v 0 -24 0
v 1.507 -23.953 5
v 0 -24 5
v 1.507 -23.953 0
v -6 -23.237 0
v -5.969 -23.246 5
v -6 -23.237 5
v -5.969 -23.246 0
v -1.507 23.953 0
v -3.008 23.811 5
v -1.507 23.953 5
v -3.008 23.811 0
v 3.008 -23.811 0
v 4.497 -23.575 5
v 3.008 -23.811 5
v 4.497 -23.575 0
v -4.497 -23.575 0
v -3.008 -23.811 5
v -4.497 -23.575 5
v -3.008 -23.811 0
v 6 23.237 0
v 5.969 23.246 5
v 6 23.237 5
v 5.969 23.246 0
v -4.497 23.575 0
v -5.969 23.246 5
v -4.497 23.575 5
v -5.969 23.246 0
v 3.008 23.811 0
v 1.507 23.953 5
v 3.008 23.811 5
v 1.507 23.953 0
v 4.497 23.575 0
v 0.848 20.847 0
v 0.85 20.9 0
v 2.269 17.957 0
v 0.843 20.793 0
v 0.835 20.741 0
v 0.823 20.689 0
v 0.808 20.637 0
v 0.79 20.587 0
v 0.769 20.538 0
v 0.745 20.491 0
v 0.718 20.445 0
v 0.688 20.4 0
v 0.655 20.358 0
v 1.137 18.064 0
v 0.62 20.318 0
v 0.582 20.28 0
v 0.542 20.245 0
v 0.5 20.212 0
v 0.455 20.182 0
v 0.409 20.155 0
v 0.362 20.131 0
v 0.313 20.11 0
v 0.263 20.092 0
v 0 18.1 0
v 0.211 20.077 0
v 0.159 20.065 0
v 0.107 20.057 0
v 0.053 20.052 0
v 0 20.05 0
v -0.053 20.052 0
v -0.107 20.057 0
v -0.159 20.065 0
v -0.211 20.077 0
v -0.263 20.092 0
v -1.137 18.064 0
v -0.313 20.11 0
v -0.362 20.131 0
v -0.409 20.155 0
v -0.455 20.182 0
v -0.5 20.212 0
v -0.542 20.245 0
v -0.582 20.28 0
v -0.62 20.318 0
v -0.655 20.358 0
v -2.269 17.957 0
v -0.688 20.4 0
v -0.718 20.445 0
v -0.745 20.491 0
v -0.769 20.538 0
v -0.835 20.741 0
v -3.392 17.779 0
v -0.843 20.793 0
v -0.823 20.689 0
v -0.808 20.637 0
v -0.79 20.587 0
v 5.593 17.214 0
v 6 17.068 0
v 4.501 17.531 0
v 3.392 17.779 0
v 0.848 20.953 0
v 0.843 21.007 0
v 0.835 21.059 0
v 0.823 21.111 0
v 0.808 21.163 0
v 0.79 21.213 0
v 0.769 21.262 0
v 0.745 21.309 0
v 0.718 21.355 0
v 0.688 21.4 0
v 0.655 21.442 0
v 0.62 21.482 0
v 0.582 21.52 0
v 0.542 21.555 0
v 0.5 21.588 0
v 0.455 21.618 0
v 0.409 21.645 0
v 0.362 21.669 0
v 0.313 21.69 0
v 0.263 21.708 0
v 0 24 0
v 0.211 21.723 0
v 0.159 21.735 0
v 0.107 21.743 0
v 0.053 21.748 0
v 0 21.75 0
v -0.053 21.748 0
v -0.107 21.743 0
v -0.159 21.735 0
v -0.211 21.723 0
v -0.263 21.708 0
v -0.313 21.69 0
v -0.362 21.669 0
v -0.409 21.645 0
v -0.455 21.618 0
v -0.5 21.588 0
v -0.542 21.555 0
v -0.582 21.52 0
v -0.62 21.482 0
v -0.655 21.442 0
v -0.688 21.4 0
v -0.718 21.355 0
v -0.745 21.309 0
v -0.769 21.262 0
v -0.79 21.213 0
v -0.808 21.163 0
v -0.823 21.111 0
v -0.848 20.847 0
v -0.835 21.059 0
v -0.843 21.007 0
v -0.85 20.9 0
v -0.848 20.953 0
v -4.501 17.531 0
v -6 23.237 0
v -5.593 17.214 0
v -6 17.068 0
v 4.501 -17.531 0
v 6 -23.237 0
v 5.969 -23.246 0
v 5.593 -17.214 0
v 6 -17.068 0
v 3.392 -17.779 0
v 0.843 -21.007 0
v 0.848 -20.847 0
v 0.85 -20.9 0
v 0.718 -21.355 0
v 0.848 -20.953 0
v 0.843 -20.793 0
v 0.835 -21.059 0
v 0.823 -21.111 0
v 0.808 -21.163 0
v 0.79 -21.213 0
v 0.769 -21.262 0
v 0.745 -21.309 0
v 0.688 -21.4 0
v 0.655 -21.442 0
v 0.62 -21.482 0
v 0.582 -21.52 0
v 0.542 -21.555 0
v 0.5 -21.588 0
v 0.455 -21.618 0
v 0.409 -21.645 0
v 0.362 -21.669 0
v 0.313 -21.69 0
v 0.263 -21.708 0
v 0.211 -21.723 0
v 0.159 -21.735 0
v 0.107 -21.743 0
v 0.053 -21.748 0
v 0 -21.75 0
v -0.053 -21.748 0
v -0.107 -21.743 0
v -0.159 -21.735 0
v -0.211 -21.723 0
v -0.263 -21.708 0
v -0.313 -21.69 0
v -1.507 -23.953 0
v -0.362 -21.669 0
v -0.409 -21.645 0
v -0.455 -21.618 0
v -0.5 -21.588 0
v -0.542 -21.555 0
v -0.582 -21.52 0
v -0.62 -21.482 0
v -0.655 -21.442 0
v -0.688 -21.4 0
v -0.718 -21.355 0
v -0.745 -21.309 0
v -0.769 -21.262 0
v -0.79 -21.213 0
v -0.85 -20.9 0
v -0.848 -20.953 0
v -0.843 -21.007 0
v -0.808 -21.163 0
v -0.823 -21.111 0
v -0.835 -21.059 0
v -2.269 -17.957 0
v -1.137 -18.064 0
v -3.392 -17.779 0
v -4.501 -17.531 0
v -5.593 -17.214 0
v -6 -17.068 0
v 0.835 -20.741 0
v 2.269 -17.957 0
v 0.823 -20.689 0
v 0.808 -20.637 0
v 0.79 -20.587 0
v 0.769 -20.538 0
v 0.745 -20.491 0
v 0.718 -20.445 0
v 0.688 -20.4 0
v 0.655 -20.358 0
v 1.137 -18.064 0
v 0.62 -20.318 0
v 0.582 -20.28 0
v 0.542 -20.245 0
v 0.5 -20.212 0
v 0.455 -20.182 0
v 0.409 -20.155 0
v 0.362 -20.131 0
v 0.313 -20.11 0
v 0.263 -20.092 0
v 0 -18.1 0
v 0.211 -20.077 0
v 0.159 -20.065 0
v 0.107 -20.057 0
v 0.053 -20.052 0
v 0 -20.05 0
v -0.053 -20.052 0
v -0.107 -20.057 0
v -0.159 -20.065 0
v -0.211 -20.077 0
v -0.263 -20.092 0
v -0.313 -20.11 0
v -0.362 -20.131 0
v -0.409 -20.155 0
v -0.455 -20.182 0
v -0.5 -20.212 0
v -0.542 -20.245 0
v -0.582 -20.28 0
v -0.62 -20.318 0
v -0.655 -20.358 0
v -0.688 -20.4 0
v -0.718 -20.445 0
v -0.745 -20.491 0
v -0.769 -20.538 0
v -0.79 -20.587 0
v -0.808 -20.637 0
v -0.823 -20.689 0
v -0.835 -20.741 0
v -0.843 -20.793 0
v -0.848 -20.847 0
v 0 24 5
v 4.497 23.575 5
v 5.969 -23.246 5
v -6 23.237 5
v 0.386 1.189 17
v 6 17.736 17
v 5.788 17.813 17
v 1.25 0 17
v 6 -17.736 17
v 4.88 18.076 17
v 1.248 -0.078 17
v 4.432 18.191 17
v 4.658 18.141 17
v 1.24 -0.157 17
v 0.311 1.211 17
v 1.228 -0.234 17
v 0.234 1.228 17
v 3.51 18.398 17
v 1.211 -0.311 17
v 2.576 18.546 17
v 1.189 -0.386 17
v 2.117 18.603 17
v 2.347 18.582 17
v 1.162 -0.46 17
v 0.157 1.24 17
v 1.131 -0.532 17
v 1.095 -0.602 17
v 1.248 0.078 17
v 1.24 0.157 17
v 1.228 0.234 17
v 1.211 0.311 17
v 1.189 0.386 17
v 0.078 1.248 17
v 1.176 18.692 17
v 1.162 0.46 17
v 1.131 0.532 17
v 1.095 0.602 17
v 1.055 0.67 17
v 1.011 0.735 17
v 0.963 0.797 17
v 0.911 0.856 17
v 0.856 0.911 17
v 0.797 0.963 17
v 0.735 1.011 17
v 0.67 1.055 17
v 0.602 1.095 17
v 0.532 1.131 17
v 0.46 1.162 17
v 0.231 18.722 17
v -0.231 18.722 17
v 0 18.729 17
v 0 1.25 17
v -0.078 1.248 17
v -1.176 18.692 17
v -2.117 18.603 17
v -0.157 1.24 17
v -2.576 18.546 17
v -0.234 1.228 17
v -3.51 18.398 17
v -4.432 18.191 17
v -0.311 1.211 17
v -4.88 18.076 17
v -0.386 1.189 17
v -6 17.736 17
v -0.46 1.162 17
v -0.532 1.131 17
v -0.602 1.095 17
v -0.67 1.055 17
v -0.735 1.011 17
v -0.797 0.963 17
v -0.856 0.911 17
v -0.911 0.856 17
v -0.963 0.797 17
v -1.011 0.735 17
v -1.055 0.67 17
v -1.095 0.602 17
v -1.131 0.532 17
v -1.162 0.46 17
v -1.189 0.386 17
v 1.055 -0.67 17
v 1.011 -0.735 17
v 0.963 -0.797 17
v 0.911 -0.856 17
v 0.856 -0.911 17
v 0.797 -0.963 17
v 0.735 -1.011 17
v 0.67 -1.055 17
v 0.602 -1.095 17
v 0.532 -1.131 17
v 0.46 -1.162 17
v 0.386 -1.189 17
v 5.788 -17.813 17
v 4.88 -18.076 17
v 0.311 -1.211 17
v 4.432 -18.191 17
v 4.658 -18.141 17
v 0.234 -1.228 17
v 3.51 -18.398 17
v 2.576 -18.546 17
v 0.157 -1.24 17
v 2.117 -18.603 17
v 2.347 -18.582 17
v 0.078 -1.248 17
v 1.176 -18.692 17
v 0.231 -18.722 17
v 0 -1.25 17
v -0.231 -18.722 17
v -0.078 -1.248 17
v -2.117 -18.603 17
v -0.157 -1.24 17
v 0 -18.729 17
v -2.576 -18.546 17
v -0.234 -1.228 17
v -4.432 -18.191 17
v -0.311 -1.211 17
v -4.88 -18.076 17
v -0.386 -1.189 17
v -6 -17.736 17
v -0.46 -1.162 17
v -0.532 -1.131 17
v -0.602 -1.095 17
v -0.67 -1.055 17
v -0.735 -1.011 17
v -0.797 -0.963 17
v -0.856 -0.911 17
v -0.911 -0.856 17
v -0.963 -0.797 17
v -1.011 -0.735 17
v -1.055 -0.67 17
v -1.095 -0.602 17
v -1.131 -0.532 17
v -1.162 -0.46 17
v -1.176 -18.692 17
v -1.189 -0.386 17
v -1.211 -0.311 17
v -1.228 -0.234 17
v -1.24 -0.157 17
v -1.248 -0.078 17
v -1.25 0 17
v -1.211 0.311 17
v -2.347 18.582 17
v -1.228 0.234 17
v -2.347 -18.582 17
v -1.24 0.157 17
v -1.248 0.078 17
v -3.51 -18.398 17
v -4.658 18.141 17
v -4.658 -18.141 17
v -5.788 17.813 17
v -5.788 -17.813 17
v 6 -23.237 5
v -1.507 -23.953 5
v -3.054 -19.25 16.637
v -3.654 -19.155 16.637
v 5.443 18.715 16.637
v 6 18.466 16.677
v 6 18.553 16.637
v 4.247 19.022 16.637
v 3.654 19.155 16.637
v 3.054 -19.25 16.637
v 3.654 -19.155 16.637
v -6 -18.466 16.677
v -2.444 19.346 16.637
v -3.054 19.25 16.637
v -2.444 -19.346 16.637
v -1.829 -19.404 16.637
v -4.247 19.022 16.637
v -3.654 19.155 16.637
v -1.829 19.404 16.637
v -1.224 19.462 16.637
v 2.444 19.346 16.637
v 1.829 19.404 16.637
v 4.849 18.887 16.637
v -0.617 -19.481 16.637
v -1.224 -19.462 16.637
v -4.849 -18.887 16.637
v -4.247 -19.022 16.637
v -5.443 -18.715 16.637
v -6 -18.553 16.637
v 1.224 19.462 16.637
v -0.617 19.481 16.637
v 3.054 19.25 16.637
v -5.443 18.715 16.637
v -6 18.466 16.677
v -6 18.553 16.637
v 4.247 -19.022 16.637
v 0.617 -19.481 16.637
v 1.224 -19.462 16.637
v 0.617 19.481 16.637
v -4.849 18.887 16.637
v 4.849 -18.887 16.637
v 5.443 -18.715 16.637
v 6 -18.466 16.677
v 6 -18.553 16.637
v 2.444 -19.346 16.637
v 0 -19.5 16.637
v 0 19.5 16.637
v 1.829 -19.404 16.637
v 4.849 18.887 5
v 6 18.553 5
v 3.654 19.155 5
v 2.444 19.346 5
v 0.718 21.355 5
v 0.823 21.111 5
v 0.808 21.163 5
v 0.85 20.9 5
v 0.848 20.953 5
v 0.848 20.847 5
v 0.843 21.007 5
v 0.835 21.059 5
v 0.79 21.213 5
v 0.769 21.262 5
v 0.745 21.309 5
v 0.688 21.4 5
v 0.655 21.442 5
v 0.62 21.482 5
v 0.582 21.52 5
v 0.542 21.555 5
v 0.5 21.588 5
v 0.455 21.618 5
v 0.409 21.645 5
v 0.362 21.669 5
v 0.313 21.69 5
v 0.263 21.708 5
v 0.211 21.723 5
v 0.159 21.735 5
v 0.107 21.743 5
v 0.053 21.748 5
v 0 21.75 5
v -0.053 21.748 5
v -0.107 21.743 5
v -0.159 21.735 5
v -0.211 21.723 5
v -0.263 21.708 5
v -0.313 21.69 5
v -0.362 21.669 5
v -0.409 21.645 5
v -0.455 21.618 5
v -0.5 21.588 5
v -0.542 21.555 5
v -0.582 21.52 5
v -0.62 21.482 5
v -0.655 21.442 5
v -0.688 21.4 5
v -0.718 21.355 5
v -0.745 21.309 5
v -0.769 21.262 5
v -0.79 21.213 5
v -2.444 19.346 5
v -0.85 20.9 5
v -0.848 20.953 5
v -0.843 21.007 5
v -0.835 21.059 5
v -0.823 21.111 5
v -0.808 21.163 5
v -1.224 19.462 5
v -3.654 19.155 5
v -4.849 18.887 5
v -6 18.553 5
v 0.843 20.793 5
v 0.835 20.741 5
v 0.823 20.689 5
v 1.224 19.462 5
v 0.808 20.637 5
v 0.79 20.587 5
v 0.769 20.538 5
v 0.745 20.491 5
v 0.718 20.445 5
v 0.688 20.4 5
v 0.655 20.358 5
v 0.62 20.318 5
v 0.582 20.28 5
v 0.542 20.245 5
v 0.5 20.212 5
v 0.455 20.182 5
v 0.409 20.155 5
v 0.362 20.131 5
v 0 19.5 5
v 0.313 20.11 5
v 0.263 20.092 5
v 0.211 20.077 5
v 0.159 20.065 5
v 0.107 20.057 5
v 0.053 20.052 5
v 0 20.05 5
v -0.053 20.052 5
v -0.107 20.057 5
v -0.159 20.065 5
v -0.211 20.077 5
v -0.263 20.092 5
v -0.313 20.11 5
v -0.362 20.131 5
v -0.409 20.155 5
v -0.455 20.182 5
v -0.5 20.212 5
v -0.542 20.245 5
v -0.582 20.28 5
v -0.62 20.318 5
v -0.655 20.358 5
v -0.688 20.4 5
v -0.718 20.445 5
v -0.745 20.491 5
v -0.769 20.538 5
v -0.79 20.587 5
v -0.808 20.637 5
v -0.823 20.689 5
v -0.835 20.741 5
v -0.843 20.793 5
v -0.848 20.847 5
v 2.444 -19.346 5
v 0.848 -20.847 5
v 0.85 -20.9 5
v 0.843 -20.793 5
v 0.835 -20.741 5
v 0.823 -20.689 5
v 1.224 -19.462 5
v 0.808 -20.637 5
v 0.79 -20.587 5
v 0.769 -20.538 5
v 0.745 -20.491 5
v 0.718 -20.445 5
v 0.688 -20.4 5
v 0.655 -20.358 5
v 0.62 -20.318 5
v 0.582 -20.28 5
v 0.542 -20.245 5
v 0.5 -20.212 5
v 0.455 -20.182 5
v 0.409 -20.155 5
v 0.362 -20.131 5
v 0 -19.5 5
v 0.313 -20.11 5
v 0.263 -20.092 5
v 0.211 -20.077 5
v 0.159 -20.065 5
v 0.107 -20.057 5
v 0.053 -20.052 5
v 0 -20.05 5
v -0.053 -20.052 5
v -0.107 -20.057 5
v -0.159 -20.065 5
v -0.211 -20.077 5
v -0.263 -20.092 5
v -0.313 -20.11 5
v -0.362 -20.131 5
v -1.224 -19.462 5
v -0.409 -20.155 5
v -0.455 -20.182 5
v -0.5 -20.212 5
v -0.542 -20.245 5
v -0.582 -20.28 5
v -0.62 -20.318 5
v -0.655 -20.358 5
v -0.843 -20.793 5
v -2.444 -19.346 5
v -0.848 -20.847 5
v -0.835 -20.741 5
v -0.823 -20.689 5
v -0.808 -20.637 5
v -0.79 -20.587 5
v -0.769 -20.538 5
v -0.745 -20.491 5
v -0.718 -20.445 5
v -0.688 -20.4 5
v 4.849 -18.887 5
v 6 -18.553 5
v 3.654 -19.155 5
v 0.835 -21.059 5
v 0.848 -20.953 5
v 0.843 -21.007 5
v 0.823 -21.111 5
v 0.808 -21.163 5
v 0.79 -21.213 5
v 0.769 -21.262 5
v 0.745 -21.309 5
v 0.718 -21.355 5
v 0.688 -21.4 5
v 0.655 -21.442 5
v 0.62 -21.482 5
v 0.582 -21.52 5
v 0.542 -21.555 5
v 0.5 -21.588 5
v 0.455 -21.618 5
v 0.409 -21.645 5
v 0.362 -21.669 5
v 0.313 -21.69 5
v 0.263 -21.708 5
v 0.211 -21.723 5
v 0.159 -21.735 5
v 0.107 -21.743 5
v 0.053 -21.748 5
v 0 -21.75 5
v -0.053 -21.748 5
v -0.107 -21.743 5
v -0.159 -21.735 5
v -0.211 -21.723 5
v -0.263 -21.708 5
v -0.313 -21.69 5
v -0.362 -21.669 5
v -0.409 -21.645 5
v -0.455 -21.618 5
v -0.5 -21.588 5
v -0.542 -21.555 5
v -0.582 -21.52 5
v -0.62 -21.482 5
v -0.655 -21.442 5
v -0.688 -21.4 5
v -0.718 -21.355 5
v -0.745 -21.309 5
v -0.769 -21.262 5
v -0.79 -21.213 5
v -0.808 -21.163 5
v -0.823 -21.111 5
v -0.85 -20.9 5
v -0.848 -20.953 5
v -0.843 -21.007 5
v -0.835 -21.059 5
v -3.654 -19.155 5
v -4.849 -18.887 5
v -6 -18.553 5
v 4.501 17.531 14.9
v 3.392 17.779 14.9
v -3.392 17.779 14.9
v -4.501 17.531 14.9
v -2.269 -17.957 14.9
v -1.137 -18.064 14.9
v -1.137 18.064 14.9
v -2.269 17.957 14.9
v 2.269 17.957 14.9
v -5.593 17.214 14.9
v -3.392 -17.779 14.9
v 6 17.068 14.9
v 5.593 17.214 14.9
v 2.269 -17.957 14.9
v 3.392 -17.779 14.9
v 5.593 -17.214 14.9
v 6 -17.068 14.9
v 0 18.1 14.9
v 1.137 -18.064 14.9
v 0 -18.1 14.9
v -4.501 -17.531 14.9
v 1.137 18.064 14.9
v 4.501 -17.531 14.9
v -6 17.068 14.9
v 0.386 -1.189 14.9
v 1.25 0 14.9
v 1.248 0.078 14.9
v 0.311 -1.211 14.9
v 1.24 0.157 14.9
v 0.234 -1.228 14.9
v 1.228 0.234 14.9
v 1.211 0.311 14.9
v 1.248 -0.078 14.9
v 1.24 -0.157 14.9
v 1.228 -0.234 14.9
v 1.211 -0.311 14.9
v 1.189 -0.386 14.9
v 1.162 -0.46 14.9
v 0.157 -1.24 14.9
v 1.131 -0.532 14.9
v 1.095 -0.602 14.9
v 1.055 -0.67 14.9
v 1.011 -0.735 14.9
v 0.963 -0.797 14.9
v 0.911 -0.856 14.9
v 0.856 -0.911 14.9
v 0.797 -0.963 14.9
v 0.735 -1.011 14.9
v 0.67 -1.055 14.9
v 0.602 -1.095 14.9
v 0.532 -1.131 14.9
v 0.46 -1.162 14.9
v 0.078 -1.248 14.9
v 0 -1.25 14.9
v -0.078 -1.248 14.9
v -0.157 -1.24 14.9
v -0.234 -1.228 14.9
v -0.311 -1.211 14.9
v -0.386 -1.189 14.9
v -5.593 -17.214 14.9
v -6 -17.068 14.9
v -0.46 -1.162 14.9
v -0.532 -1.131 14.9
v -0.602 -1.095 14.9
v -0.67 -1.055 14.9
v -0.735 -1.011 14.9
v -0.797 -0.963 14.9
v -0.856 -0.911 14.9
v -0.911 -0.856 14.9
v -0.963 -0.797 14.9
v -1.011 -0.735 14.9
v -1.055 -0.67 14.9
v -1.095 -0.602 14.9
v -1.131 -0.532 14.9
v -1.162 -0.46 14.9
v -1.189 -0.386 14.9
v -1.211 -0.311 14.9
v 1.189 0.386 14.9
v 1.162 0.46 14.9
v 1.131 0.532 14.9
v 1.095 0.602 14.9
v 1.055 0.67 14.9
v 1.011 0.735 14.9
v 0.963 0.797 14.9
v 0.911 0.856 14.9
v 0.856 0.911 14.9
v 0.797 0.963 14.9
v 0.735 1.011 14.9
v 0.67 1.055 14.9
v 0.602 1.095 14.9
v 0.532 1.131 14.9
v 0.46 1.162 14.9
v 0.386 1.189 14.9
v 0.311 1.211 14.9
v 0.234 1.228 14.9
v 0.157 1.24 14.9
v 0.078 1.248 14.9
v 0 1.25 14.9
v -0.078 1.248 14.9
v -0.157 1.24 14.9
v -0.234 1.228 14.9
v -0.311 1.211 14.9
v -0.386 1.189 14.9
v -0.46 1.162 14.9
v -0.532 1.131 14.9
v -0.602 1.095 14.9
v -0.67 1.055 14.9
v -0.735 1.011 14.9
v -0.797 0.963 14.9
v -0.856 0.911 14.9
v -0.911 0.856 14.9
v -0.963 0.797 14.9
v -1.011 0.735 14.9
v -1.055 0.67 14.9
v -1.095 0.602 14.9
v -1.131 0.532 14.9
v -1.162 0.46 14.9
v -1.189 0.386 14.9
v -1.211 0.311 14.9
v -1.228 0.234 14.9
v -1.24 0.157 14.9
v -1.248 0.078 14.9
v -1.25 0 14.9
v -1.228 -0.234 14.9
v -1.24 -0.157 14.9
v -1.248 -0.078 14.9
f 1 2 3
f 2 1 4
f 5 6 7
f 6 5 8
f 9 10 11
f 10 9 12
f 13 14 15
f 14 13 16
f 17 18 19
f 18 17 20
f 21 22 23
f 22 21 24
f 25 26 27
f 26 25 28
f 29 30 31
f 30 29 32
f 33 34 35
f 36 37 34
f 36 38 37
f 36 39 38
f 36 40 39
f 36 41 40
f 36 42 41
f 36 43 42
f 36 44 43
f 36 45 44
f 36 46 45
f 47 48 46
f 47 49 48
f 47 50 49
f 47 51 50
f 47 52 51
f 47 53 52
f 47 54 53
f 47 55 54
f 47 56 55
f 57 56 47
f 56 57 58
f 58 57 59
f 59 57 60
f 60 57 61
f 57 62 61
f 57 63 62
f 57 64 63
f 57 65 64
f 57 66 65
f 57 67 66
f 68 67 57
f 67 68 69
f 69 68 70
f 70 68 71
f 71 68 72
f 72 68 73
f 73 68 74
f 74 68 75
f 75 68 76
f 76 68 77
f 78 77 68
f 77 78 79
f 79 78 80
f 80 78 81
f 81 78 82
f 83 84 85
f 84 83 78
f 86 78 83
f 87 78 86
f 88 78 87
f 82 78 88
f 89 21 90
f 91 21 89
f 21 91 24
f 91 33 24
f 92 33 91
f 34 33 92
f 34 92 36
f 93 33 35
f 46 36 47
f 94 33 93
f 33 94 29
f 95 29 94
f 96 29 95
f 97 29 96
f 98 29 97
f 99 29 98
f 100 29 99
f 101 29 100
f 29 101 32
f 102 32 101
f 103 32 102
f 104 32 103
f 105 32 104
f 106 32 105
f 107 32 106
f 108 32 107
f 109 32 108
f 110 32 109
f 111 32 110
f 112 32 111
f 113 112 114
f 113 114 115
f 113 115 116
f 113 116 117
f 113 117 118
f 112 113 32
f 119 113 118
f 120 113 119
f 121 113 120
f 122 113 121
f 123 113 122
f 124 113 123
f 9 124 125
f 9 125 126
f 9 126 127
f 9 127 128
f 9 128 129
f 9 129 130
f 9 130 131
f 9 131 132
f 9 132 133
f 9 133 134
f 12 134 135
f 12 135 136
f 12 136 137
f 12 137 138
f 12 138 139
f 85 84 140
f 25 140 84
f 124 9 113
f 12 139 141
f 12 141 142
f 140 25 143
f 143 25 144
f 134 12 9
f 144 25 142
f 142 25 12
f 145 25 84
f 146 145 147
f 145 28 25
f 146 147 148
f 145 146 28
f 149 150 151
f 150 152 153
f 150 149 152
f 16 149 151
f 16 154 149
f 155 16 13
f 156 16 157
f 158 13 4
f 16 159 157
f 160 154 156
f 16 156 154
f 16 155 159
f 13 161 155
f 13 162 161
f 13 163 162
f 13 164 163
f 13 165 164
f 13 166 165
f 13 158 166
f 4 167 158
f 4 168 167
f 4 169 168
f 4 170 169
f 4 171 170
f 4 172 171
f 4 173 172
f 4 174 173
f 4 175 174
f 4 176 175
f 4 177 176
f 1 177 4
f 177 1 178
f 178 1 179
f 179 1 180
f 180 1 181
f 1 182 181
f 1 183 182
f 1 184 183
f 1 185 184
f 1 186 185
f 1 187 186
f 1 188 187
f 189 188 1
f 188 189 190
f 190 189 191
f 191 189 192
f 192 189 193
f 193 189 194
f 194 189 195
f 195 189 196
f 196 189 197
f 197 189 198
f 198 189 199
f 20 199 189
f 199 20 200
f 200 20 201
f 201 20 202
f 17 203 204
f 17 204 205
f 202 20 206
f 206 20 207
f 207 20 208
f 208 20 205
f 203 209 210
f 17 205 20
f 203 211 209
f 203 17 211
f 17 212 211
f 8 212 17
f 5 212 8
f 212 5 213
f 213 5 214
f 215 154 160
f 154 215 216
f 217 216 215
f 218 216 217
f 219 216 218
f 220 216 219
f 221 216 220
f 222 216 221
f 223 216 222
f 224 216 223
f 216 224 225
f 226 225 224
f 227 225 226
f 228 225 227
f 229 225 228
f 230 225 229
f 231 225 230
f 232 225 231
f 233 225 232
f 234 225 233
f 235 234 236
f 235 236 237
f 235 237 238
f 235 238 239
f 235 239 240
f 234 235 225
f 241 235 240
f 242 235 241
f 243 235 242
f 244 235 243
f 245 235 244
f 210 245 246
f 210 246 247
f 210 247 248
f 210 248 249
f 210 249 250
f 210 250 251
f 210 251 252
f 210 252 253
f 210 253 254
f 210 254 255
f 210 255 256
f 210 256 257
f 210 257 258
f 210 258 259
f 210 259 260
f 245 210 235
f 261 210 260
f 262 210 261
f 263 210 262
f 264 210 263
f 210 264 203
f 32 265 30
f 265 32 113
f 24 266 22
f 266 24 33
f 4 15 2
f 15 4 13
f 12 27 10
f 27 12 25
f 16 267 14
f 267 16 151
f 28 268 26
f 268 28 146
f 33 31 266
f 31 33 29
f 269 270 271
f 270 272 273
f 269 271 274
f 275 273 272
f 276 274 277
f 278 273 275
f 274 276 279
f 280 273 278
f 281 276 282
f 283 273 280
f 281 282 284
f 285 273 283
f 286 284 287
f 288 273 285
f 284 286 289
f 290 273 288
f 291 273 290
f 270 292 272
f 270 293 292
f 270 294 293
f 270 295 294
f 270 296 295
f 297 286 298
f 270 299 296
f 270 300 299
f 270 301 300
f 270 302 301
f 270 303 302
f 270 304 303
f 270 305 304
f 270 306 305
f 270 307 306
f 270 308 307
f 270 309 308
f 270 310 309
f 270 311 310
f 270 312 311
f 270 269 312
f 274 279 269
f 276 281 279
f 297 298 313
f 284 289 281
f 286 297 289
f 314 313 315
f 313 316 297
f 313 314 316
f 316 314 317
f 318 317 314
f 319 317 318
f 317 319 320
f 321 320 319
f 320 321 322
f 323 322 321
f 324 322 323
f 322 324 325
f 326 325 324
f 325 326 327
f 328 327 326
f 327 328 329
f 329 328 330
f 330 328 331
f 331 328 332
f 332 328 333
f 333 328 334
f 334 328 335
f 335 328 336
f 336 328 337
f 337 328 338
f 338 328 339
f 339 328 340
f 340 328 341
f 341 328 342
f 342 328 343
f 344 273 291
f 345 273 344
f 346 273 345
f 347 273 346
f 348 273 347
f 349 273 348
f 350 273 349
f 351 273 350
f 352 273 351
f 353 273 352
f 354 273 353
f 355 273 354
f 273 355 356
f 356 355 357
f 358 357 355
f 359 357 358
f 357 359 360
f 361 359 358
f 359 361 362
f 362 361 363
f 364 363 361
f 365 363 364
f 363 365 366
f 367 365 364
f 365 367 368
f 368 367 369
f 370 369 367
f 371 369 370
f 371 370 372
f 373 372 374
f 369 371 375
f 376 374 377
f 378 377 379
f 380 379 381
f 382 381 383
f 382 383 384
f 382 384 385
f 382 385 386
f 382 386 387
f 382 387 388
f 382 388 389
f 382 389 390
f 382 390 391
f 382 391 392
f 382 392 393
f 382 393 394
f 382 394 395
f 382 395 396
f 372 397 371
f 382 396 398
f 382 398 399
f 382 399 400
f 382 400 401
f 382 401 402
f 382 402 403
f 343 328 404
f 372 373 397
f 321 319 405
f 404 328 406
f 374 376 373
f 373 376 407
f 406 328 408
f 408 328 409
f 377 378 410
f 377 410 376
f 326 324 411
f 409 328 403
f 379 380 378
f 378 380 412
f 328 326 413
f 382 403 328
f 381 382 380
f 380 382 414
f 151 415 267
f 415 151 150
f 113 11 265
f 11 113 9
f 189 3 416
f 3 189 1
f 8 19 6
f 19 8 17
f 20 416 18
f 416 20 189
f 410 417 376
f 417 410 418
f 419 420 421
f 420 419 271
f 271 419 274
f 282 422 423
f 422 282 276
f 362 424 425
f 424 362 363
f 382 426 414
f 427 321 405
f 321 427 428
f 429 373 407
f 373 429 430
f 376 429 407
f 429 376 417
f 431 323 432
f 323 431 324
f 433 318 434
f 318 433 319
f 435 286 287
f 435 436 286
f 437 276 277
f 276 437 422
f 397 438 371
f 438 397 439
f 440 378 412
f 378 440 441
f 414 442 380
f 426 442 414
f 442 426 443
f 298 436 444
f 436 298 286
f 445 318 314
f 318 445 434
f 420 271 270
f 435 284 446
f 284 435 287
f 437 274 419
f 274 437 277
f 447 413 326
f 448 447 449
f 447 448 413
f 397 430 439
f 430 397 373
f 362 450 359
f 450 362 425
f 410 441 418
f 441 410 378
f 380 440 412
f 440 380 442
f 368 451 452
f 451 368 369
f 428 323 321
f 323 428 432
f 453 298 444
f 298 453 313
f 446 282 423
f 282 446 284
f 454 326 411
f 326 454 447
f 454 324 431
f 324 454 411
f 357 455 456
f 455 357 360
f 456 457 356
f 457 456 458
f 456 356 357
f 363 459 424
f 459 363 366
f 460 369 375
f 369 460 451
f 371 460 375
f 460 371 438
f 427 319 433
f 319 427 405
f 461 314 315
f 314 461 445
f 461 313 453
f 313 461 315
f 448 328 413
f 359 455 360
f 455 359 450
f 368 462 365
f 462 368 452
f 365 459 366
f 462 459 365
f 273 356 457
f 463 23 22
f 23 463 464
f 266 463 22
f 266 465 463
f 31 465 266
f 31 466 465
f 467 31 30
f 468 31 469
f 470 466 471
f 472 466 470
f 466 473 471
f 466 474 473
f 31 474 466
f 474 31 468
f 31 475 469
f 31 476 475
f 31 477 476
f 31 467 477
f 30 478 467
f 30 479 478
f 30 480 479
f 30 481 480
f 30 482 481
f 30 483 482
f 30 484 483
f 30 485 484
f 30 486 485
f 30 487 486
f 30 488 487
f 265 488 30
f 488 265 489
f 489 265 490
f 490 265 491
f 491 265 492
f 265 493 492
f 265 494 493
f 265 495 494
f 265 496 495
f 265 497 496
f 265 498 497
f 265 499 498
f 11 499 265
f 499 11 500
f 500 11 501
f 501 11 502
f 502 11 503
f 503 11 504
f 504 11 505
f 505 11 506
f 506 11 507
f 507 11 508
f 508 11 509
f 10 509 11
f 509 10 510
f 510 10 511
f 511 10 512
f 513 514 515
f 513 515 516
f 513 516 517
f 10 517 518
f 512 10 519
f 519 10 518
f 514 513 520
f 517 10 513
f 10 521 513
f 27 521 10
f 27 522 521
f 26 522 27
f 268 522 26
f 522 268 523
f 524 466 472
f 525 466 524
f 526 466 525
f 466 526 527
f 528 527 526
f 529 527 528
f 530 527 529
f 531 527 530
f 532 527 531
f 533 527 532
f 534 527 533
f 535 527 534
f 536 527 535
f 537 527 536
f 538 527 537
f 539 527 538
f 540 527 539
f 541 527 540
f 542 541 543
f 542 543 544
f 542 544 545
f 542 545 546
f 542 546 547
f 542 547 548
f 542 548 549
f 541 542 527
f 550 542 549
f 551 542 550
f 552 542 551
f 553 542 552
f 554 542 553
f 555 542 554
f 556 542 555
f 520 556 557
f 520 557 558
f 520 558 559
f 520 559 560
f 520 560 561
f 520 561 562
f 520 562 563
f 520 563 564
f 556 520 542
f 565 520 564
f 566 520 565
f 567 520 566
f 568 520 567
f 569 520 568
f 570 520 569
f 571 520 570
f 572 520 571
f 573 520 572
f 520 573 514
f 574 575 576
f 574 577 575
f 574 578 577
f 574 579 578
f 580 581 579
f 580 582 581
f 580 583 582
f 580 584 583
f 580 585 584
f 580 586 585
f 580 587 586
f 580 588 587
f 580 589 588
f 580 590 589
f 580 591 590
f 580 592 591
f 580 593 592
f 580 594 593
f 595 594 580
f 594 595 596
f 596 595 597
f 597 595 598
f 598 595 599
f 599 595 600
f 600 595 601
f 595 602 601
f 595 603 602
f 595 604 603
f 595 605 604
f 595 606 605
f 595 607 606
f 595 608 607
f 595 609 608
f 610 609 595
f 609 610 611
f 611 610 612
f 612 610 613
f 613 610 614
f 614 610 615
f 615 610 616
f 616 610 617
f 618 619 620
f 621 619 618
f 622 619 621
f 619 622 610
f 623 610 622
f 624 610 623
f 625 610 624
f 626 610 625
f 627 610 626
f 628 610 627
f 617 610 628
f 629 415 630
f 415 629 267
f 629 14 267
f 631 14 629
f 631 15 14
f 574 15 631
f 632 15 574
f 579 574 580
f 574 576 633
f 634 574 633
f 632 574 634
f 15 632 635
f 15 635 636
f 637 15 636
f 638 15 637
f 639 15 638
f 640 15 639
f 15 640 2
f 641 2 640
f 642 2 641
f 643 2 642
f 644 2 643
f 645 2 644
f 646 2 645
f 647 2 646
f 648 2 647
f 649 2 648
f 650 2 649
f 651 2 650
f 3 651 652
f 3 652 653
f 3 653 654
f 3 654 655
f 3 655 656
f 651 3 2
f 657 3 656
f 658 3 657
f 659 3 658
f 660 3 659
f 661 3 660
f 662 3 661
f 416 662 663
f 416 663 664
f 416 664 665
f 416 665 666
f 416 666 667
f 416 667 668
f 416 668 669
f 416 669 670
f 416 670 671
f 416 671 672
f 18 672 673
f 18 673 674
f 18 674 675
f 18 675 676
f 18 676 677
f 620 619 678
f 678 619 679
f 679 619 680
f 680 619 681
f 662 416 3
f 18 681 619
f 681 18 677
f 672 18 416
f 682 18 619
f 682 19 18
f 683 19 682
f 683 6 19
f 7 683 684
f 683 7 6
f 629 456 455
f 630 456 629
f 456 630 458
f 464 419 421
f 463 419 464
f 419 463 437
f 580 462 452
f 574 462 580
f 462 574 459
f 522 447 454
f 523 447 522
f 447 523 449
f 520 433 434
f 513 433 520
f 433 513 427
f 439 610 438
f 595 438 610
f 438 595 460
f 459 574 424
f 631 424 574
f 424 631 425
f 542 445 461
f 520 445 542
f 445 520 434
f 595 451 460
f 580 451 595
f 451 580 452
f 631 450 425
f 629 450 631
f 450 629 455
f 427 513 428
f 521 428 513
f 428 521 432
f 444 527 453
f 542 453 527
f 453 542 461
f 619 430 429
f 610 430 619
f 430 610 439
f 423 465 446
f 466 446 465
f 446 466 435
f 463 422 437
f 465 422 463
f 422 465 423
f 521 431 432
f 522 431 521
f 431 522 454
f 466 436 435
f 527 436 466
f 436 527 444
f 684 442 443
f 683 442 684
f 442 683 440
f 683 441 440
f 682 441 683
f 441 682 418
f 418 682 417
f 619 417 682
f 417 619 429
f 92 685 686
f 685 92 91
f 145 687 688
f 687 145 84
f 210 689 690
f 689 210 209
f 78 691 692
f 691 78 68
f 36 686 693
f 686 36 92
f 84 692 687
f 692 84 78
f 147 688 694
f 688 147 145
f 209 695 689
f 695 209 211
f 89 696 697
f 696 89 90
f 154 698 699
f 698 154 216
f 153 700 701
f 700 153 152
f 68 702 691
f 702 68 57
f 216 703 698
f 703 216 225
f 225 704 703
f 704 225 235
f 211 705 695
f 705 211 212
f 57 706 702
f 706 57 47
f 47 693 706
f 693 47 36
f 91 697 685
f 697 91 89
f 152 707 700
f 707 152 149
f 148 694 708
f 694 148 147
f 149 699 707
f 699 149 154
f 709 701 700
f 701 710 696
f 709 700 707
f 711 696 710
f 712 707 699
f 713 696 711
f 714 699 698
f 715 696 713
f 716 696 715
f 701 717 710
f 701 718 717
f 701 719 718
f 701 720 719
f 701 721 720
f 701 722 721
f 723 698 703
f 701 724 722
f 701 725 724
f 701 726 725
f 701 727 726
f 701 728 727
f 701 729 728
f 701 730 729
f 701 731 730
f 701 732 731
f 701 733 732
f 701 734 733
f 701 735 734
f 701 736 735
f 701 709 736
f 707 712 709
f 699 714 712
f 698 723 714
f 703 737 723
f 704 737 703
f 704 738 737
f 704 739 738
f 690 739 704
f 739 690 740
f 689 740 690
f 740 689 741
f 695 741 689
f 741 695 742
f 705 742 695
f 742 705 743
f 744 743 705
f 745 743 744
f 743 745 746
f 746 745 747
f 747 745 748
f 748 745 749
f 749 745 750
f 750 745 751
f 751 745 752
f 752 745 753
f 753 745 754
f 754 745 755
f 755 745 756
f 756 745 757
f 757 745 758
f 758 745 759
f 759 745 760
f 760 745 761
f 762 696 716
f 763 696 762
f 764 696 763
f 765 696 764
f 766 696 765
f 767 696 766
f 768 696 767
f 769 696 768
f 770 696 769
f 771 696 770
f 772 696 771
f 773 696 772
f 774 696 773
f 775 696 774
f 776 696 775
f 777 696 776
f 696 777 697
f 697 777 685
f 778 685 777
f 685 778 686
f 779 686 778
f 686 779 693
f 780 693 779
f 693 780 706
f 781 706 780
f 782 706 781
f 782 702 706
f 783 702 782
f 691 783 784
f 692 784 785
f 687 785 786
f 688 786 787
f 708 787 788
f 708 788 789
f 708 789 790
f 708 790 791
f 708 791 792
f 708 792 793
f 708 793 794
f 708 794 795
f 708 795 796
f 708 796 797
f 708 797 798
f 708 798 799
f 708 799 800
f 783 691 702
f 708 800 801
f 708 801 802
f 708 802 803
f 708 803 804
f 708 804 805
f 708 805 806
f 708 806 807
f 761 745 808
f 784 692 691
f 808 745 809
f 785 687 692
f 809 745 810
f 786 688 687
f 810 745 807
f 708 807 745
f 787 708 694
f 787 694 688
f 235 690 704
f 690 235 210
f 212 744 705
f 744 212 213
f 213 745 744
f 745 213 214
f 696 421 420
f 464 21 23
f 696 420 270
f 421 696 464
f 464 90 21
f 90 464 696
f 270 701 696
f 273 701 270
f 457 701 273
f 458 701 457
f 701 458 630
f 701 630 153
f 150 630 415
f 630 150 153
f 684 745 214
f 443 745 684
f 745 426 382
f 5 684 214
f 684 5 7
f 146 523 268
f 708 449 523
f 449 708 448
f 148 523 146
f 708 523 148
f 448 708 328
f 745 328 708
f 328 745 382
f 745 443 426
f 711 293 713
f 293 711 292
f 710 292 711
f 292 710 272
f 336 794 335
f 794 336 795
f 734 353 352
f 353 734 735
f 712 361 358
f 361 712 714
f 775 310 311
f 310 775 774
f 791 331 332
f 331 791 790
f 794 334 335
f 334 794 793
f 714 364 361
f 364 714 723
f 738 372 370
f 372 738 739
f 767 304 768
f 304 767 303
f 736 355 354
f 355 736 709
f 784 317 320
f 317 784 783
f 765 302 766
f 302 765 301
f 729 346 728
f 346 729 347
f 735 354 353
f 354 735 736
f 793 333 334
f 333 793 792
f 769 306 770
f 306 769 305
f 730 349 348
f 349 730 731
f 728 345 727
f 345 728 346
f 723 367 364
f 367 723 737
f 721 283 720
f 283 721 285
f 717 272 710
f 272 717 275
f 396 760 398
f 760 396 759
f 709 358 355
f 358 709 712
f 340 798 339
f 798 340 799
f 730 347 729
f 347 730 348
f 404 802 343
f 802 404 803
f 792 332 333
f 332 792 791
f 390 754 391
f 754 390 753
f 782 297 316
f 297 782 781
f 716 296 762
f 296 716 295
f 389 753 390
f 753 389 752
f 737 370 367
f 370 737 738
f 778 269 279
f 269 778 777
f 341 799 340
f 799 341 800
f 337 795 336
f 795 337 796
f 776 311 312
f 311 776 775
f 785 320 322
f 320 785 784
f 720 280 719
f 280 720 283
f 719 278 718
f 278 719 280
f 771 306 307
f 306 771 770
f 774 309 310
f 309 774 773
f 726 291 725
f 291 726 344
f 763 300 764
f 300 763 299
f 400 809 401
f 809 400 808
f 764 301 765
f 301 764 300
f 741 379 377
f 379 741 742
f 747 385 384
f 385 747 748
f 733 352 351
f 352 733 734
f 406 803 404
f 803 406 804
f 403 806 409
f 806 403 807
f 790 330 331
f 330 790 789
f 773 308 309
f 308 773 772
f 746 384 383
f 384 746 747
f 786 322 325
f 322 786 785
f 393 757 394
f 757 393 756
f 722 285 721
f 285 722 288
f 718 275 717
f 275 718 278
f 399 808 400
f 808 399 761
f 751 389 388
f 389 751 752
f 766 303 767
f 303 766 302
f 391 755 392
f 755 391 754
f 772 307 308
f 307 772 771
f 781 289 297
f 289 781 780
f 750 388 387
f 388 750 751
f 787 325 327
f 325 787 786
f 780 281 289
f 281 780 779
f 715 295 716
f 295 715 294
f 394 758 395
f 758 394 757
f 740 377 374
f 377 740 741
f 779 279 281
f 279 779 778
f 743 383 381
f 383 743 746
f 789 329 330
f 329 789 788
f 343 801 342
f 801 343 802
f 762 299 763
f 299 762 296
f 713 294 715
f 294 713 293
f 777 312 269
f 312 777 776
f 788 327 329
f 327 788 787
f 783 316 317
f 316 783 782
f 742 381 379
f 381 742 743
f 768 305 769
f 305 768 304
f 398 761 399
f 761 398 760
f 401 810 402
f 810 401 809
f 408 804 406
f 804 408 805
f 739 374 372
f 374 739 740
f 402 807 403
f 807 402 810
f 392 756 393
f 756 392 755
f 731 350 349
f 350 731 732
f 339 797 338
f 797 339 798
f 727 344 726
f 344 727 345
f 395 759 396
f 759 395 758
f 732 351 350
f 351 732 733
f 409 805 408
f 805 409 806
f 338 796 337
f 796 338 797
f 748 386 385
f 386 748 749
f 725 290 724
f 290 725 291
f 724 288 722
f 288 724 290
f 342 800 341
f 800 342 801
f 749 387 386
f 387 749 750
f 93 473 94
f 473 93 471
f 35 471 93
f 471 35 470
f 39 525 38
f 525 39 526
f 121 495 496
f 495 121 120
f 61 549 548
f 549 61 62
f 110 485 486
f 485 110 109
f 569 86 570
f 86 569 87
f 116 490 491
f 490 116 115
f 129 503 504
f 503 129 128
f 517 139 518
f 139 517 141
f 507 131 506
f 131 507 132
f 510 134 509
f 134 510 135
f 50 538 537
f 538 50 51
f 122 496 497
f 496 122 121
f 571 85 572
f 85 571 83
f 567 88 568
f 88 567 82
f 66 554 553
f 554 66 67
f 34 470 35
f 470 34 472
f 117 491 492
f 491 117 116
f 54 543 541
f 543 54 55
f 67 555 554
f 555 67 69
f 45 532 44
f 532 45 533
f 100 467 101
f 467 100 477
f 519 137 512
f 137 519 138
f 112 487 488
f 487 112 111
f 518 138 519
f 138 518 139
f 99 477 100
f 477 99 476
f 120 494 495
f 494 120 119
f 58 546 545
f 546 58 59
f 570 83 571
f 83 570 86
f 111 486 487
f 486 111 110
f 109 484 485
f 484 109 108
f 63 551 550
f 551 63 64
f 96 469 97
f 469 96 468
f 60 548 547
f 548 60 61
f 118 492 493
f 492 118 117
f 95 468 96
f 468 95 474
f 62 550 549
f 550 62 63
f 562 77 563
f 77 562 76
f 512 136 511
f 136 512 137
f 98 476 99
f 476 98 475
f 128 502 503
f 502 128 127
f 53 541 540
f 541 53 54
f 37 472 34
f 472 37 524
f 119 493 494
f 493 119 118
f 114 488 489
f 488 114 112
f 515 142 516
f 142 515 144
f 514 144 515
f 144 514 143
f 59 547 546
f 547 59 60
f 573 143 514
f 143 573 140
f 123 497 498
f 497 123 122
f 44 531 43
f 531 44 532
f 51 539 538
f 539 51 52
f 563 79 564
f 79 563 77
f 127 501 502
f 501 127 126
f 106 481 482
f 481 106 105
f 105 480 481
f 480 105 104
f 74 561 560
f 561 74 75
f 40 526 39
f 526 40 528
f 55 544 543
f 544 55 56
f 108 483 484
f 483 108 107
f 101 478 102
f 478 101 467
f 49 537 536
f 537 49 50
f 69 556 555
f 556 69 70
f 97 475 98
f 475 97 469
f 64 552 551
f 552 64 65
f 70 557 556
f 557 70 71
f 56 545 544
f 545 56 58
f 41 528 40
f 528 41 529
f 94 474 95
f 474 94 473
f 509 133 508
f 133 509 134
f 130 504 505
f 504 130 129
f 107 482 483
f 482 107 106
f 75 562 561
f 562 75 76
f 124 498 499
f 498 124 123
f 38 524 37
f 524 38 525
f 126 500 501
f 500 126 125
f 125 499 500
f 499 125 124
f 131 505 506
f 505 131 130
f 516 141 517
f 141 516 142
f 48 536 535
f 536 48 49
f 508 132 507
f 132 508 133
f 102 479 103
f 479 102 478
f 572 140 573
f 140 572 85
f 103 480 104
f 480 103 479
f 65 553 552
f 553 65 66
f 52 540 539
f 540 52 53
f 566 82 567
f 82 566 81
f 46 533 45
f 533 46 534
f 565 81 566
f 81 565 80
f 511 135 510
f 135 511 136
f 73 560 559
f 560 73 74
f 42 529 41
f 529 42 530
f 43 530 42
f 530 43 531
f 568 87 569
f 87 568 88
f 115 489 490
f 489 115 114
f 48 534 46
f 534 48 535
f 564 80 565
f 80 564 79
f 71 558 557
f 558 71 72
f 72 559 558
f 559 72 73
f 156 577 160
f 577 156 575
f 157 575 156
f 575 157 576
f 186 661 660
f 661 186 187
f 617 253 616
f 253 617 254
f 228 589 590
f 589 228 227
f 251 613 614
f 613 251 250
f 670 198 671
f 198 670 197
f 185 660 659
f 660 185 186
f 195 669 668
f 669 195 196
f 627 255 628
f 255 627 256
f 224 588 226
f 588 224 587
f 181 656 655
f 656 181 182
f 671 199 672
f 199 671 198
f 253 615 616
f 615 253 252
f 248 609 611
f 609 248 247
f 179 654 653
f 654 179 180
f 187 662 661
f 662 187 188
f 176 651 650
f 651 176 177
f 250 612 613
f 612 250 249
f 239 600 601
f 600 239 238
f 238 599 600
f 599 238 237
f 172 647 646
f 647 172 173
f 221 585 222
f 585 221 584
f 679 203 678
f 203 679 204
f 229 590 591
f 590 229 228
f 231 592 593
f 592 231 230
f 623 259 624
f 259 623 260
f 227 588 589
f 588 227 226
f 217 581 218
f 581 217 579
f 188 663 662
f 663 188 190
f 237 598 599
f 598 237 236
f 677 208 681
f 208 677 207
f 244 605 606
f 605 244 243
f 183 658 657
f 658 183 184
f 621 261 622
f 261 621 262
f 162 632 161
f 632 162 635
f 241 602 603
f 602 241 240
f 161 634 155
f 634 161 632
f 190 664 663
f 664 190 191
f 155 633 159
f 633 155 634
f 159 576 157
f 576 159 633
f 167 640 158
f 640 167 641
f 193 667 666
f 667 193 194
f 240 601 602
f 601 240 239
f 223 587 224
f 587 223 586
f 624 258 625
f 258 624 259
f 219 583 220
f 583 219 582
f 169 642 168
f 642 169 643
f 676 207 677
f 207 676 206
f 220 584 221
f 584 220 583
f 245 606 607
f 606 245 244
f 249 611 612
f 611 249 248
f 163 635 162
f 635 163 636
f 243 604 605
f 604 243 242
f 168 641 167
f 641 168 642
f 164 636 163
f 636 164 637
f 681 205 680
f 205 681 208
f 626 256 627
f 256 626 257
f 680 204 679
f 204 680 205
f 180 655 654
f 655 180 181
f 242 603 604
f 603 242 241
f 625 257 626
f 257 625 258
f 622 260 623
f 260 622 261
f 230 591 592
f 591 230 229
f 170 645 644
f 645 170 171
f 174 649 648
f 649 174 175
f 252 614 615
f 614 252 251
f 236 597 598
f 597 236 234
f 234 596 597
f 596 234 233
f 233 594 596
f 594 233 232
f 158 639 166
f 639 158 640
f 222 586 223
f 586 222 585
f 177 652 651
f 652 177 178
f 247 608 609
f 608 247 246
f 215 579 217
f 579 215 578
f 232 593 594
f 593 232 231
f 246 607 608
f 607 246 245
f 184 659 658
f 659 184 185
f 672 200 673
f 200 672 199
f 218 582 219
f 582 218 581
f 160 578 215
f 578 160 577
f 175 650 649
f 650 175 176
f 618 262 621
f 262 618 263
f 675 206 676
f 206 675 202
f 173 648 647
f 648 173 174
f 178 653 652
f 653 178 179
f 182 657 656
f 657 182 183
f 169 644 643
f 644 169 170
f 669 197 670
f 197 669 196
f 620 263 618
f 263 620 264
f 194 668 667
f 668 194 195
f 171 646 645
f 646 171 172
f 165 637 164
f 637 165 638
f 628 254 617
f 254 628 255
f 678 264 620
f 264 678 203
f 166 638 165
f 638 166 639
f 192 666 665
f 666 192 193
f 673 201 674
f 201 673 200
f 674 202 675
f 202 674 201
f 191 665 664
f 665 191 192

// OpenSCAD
$fn=100;
module motor_mount(){
    motor_radius = 35;
    motor_height = 15;
    attach_hole_dimention = 41.8;
    motormax_radius = 48;
    difference(){
        intersection(){
            cylinder(r=motormax_radius/2,h=motor_height+2);
            translate([0,0,-25])
            sphere(r=46);
        }
        translate([0,0,5])
        difference(){
            cylinder(r=motormax_radius/2+1,h=motor_height+2);
            cylinder(r=motor_radius/2+2,h=motor_height+2);
        }
        translate([0,0,-0.1])
        cylinder(r=(motor_radius+1)/2+0.1,h=motor_height);
        translate([50+6,0,0])
        cube([100,100,100],center=true);
        translate([-50-6,0,0])
        cube([100,100,100],center=true);
        cylinder(r=2.5/2,h=100,center=true);
        
        translate([0,attach_hole_dimention/2,-0.1])
        cylinder(r=1.7/2,h=6);
        translate([0,-attach_hole_dimention/2,-0.1])
        cylinder(r=1.7/2,h=6);
    }
}

motor_mount();
